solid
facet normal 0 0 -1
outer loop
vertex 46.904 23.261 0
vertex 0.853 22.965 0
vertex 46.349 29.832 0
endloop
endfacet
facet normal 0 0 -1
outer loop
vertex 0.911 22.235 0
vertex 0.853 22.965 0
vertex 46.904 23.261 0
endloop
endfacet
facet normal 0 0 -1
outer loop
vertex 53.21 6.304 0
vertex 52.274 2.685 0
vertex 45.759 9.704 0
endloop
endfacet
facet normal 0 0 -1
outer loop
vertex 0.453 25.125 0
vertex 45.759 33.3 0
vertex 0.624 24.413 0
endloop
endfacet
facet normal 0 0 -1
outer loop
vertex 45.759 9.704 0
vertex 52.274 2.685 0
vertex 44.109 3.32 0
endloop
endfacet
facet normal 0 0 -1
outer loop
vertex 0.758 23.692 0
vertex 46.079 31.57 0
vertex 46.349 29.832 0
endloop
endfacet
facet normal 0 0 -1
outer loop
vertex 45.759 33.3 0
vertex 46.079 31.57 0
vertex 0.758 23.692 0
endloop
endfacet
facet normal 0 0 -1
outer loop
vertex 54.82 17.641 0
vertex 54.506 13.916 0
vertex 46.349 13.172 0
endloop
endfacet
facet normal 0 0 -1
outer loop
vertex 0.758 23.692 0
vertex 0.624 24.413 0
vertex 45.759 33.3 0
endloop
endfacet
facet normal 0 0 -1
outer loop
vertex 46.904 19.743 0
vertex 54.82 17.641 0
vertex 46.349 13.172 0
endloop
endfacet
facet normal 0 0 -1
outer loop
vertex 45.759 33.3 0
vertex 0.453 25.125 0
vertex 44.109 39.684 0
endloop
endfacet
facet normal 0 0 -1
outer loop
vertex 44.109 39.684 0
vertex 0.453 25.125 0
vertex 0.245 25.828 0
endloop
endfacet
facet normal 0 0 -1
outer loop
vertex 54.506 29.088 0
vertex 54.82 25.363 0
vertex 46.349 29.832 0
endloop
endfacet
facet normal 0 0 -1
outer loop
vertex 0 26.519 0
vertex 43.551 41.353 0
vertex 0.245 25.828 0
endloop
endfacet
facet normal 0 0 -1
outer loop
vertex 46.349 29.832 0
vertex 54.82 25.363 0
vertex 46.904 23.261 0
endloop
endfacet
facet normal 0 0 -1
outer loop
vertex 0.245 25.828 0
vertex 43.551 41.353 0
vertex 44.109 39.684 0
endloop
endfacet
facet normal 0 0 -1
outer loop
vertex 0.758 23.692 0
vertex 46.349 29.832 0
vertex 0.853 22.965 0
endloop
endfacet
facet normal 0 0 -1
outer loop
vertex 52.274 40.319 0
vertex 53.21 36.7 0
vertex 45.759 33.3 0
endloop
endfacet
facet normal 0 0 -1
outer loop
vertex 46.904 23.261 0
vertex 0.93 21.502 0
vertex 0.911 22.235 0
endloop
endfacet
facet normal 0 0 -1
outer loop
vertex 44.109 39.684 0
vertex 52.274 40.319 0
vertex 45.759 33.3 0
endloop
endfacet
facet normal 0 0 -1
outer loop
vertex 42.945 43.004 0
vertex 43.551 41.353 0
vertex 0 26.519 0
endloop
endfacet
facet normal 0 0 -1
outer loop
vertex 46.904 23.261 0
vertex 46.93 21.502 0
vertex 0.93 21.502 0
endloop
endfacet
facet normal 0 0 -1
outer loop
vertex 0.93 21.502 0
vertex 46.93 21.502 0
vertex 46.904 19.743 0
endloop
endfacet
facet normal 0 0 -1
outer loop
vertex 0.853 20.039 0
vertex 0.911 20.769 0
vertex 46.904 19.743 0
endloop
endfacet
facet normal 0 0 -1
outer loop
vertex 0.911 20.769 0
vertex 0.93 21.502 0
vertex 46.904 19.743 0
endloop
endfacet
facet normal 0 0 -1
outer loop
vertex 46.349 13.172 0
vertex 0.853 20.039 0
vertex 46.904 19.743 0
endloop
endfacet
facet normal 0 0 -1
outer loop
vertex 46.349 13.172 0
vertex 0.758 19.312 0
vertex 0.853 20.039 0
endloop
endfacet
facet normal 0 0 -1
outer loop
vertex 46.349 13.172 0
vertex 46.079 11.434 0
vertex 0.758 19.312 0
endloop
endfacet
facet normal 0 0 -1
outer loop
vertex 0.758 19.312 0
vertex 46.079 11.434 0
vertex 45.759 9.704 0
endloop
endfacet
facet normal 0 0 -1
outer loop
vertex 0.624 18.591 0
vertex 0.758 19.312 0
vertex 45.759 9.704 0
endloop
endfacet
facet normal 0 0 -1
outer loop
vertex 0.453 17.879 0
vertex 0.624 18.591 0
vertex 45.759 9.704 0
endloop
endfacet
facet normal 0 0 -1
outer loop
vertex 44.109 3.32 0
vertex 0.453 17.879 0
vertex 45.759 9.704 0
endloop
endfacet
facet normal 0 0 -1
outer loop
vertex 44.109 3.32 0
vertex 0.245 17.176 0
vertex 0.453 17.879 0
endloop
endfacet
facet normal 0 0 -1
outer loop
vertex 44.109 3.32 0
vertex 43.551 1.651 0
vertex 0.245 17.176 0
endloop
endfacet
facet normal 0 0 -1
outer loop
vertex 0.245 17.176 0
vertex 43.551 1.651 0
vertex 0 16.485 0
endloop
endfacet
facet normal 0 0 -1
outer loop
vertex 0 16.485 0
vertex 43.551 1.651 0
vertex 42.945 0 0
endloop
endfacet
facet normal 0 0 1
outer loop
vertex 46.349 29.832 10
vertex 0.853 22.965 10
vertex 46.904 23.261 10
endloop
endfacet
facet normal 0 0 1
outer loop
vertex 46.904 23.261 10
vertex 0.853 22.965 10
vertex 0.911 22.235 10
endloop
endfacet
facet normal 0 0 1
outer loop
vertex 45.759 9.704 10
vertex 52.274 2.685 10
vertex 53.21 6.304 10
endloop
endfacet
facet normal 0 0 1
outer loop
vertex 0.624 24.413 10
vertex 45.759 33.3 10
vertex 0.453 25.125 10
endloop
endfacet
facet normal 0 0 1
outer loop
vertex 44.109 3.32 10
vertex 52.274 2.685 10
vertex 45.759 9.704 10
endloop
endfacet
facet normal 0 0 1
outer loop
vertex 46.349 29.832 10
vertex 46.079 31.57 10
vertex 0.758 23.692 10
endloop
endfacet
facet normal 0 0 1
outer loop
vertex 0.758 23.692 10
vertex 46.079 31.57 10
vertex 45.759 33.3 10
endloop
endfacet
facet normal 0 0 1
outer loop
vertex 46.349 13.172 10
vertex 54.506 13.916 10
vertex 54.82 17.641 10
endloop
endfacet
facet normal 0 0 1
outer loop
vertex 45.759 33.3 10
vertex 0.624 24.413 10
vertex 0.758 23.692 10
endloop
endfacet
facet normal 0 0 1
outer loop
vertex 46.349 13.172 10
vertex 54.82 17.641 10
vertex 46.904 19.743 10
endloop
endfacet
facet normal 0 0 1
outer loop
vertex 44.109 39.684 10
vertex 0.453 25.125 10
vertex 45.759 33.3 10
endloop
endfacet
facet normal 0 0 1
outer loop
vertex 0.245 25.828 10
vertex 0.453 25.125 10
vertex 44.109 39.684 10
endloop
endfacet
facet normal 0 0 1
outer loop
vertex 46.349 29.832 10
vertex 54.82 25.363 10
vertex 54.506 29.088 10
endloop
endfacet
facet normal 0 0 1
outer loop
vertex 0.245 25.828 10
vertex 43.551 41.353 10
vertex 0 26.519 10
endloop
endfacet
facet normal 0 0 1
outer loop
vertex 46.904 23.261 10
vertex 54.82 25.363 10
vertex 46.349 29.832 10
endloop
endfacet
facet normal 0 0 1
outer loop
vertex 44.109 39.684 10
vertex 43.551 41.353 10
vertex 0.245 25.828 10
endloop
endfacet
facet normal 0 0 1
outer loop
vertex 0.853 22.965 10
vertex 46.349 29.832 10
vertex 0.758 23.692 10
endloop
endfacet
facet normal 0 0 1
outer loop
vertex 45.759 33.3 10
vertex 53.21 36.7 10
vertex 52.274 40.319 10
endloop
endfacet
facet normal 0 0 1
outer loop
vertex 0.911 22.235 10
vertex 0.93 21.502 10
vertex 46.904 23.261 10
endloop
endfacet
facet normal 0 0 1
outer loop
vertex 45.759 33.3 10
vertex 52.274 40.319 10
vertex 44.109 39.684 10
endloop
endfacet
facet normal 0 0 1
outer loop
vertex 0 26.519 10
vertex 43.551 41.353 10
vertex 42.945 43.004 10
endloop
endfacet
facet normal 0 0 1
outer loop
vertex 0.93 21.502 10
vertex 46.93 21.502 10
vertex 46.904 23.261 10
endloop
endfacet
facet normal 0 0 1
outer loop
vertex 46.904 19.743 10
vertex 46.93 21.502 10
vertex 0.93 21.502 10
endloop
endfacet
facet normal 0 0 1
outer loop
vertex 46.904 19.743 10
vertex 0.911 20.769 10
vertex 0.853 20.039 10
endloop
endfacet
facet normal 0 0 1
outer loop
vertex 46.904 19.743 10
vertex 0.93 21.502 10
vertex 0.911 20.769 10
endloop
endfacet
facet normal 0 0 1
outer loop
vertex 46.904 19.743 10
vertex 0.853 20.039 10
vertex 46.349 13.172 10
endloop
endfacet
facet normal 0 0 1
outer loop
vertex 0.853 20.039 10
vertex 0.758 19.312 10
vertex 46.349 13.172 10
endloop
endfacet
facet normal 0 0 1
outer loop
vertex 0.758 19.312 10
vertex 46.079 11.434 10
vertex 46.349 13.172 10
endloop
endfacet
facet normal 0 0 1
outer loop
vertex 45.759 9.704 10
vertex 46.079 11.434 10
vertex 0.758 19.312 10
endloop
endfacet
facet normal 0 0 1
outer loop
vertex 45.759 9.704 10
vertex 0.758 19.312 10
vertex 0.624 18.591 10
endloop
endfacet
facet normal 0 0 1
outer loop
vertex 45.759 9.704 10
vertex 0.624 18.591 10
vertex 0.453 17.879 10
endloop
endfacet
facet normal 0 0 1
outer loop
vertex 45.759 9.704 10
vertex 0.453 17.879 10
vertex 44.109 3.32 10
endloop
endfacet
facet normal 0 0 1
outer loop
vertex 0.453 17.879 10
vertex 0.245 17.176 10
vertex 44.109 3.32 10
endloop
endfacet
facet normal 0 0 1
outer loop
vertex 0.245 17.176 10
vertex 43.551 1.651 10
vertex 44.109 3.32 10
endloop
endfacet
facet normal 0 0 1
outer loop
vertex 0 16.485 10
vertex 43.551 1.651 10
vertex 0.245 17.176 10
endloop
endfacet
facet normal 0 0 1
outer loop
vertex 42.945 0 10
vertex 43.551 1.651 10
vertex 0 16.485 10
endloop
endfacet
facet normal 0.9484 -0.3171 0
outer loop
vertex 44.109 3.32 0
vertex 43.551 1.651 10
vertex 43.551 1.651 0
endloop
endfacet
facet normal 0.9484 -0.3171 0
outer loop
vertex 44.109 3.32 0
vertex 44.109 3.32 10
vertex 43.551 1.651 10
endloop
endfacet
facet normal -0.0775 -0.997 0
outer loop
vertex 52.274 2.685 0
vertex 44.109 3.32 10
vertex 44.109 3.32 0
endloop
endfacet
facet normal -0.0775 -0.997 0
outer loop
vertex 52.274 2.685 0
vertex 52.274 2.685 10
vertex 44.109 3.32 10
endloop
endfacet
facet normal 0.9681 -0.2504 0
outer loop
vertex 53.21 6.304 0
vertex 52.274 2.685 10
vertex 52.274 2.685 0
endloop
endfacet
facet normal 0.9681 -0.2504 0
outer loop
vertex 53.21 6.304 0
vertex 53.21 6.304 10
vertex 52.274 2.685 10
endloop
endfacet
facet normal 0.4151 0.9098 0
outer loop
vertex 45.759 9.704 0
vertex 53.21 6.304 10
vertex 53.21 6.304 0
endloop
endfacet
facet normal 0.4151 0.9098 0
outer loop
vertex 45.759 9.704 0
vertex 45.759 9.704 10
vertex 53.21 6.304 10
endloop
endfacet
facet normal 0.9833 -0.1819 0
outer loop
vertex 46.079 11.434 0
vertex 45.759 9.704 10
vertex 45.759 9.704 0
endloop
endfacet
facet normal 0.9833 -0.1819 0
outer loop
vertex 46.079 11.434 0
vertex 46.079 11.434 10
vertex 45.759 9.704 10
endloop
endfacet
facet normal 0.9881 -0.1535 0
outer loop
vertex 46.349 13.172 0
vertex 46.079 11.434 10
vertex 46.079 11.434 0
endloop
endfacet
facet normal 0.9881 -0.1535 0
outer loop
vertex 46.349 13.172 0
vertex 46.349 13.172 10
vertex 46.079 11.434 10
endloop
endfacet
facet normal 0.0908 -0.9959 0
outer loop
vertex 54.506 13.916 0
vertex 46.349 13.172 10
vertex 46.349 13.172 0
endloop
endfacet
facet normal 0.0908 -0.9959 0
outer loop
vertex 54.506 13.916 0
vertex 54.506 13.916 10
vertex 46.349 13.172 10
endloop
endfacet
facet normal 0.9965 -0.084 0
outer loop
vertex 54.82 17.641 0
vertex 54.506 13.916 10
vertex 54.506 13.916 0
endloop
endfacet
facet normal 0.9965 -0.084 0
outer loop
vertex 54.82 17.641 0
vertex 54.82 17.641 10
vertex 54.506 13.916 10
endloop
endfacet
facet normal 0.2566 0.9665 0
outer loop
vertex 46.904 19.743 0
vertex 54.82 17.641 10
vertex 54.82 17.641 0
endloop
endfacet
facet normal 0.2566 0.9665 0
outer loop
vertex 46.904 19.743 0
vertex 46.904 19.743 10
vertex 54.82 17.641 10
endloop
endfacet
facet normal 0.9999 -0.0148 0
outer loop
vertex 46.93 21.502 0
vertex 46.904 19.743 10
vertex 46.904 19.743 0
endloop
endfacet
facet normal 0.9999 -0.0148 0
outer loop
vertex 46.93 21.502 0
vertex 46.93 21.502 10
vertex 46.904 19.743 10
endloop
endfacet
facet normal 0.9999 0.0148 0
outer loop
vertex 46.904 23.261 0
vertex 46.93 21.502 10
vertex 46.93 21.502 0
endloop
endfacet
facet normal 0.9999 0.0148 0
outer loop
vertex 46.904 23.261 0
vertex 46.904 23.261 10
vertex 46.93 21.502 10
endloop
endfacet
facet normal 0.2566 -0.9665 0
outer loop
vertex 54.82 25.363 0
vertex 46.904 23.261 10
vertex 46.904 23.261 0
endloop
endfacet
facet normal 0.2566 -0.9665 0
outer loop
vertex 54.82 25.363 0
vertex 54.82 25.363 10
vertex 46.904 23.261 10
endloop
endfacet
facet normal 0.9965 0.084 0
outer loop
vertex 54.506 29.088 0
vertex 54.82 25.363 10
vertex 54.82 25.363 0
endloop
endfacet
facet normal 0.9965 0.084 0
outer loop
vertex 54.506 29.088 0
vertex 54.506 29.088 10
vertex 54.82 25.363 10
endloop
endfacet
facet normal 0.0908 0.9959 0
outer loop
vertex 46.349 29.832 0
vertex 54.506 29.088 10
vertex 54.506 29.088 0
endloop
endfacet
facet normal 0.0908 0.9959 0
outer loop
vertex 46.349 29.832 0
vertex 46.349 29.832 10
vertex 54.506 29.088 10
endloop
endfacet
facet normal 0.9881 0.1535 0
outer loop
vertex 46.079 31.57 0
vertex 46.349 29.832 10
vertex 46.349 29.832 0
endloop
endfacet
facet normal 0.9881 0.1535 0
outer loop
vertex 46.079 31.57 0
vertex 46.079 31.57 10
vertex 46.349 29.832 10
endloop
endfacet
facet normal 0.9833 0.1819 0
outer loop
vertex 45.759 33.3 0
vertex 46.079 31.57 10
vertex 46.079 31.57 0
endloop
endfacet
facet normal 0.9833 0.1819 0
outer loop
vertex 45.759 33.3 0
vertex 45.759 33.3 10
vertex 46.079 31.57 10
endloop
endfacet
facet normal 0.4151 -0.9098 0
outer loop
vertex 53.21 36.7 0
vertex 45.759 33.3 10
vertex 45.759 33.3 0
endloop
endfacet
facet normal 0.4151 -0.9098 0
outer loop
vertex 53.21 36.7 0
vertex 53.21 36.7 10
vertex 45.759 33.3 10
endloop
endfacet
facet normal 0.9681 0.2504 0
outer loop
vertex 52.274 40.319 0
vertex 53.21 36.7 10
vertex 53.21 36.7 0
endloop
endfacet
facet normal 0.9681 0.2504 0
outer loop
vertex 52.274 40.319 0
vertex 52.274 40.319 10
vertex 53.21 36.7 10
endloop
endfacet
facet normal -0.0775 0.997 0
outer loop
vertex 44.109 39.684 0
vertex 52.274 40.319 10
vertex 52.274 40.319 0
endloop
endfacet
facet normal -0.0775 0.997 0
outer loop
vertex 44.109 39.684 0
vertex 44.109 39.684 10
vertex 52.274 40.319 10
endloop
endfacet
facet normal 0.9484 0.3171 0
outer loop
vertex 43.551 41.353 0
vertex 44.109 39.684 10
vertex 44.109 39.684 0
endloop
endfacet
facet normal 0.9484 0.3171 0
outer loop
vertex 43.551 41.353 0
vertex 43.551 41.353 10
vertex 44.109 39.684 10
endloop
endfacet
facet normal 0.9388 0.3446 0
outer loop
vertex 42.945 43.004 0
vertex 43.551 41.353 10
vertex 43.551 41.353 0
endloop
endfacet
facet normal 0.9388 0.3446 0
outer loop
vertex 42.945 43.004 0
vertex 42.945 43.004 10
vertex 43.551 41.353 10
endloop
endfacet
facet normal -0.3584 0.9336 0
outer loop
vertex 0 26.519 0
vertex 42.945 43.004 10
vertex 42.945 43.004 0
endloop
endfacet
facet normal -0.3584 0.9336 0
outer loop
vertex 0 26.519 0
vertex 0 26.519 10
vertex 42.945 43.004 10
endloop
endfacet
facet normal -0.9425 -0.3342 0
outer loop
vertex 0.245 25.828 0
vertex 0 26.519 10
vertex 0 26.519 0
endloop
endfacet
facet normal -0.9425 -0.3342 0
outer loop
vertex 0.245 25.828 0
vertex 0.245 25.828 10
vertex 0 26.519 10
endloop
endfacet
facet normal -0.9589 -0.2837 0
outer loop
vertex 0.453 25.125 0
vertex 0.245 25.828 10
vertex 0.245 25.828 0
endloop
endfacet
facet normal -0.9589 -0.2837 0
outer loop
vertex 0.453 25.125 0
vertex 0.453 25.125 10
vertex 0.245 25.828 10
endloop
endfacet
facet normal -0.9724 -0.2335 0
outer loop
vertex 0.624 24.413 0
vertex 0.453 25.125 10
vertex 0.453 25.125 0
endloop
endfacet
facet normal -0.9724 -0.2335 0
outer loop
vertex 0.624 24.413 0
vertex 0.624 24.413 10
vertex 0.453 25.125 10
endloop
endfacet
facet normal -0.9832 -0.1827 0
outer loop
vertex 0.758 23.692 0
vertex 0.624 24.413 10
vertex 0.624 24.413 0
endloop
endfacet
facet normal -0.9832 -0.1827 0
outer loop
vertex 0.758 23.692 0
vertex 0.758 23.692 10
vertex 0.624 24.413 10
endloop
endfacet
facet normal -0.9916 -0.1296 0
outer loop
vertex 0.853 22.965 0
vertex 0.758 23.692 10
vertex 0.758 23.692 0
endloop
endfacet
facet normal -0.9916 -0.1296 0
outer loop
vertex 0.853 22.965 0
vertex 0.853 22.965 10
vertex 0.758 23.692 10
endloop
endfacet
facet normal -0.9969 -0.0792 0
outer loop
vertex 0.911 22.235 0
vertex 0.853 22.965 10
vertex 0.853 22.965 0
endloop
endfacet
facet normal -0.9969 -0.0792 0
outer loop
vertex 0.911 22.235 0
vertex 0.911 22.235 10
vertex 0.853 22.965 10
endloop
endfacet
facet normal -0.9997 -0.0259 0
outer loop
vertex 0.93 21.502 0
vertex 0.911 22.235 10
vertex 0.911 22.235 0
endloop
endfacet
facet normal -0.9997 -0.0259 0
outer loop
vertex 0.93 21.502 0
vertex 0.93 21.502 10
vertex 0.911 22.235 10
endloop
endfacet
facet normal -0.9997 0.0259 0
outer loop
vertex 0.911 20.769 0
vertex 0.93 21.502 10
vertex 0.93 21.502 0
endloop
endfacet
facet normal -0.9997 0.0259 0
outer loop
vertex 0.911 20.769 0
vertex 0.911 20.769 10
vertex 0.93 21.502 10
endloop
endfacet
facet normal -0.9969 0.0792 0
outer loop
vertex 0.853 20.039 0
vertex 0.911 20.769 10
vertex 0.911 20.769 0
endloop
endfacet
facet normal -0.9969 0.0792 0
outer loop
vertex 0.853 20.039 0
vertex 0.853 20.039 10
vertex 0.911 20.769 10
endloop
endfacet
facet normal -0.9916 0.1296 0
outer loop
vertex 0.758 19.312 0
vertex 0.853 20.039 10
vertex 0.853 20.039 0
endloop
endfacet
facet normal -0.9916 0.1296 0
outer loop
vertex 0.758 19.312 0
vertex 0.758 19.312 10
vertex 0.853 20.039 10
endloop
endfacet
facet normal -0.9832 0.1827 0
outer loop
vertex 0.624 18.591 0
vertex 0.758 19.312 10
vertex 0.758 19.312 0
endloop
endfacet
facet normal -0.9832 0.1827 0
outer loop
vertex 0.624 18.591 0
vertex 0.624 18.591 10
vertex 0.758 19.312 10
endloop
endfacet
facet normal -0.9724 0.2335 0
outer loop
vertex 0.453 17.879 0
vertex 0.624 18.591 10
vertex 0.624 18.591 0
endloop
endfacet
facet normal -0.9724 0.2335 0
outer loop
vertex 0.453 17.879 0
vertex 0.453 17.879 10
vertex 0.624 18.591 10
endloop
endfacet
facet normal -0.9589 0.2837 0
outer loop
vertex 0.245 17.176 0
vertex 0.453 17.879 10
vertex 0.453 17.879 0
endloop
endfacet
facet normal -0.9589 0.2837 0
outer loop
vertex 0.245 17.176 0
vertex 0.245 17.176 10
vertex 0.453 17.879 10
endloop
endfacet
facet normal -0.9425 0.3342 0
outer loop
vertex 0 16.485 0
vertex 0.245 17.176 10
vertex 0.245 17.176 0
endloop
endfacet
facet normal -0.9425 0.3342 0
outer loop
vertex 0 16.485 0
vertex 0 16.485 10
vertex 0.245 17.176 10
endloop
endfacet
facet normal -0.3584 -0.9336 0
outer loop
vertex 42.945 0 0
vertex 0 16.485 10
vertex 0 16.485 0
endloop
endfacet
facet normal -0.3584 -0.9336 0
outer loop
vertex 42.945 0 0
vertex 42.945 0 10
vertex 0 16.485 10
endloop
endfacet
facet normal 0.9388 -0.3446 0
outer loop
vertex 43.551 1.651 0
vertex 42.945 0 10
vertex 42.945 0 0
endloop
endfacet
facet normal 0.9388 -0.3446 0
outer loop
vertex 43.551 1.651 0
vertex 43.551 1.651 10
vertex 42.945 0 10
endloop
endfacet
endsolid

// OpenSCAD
$fn = 32;

// ----------------------------------------------------------------------
// Gear sector: 4 teeth on 42 degrees
// ----------------------------------------------------------------------

// --- parameters (mm) ---
sector_angle = 42;        // sector angle, degrees
root_r = 60;              // root circle radius
tooth_h = 8;              // tooth height over the root circle
teeth = 4;                // number of teeth on the sector
hub_r = 14;               // hub bore radius
plate_t = 10;             // sector thickness, Z
arc_step = 3;             // sampling step of the root/hub arcs, degrees
fit_tol = 0.02;           // declared fit tolerance (prompt contract)
free_tol = 0.2;           // declared free tolerance (prompt contract)

tip_r = root_r + tooth_h;  // tip circle radius

profile = [[42.945, 0], [43.551, 1.651], [44.109, 3.32], [52.274, 2.685], [53.21, 6.304], [45.759, 9.704], [46.079, 11.434], [46.349, 13.172], [54.506, 13.916], [54.82, 17.641], [46.904, 19.743], [46.93, 21.502], [46.904, 23.261], [54.82, 25.363], [54.506, 29.088], [46.349, 29.832], [46.079, 31.57], [45.759, 33.3], [53.21, 36.7], [52.274, 40.319], [44.109, 39.684], [43.551, 41.353], [42.945, 43.004], [0, 26.519], [0.245, 25.828], [0.453, 25.125], [0.624, 24.413], [0.758, 23.692], [0.853, 22.965], [0.911, 22.235], [0.93, 21.502], [0.911, 20.769], [0.853, 20.039], [0.758, 19.312], [0.624, 18.591], [0.453, 17.879], [0.245, 17.176], [0, 16.485]];  // primary outline, 38 points, counter clockwise

// --- the one profile operation ---
linear_extrude(height = plate_t) polygon(points = profile);
